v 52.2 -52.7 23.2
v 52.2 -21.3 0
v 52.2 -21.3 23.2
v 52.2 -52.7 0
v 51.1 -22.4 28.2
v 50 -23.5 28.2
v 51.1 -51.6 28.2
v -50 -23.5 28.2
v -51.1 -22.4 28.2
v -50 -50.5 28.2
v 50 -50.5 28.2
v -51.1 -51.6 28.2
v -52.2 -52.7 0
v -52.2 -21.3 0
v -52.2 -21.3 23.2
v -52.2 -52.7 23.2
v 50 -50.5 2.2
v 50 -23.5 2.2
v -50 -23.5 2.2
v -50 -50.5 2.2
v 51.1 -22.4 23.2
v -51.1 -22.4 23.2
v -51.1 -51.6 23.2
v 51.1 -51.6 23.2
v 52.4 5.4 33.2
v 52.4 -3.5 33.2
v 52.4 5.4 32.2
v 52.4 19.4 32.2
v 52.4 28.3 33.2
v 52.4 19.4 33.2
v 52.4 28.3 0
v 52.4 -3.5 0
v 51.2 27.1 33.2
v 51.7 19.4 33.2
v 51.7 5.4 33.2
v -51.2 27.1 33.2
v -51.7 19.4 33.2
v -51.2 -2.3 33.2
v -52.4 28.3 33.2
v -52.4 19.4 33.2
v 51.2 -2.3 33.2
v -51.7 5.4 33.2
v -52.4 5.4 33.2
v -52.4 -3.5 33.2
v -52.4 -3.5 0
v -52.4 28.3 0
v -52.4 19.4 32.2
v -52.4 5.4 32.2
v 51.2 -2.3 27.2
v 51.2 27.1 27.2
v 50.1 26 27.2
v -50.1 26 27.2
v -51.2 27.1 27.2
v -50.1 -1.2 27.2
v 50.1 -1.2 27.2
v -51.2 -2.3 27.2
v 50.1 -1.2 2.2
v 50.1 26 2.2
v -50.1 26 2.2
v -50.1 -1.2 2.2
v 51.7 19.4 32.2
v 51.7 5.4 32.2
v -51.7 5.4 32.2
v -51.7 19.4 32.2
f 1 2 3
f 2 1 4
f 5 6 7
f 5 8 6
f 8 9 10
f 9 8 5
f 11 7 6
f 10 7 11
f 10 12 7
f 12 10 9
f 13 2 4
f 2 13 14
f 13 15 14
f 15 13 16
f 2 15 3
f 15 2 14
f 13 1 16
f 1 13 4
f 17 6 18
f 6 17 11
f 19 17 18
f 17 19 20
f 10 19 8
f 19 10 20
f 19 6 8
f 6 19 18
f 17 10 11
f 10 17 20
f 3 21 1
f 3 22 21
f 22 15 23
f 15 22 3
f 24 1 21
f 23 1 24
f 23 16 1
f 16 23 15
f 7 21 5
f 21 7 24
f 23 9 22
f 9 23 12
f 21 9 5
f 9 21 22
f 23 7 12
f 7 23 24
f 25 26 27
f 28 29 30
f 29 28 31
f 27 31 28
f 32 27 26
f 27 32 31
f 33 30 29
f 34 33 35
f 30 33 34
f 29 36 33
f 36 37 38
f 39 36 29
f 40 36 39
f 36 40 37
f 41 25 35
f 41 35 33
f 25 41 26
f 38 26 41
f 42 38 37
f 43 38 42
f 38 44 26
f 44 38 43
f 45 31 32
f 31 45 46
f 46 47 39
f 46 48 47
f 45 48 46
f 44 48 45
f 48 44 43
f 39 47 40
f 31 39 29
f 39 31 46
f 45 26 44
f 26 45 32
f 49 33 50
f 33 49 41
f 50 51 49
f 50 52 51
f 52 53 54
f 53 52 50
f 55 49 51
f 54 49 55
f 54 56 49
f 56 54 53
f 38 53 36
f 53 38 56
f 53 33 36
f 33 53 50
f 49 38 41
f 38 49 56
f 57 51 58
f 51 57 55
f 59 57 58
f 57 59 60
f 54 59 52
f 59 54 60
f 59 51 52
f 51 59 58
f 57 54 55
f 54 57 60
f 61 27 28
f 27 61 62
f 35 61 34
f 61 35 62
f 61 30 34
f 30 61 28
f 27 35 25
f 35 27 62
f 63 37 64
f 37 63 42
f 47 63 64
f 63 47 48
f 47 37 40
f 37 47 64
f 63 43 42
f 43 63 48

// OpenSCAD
offset=10;

inner_dim_x=100;
inner_dim_y=27;
inner_dim_z=26;
wall_thickness=2.2;

shoulder_thickness=1;
shoulder_height=5;
cover_height_without_shoulder=25;
cover_height=shoulder_height+cover_height_without_shoulder;
spacing=0.2;
spacing_vertical=1;



Assembly();

module Assembly(){
    translate([0,-inner_dim_y-offset,0]) Box();
    translate([0,inner_dim_y+offset,0]) Box_Cover();
}
module Box(){
    translate([0,0,(inner_dim_z+wall_thickness)/2])
    difference(){
    difference(){
            cube ([inner_dim_x+(2*wall_thickness),inner_dim_y+(2*wall_thickness),inner_dim_z+wall_thickness], center= true);
            
        Inner_Cube();
        }
    Outer_Shoulder();
    }
}
    
module Inner_Cube(){
    translate ([0,0,wall_thickness/2]) cube ([inner_dim_x,inner_dim_y,inner_dim_z], center= true);
    }
    
module Outer_Shoulder(){
    translate ([0,0,(((inner_dim_z+wall_thickness)/2)-shoulder_height/2)])
    difference(){
        cube ([inner_dim_x+(2*wall_thickness),inner_dim_y+(2*wall_thickness),shoulder_height], center= true);
        cube ([inner_dim_x+wall_thickness,inner_dim_y+wall_thickness,shoulder_height], center= true);
        }
}
    
module Box_Cover(){
    translate([0,-((inner_dim_y+wall_thickness)/2)-10,(cover_height+wall_thickness+spacing_vertical)/2]){
        difference(){
            difference(){
                difference(){
                    cube ([inner_dim_x+(2*wall_thickness)+2*spacing,inner_dim_y+(2*wall_thickness)+2*spacing,cover_height+wall_thickness+spacing_vertical], center= true);
                    translate ([0,0,wall_thickness/2+(cover_height-shoulder_height)/2]) cube ([inner_dim_x+wall_thickness+spacing,inner_dim_y+wall_thickness+spacing,shoulder_height+spacing_vertical], center= true);
                    translate ([0,0,wall_thickness/2]) cube ([inner_dim_x+spacing,inner_dim_y+spacing,cover_height+spacing_vertical], center= true);
                }
                color("red") translate([(inner_dim_x)/2+wall_thickness,0,(cover_height+spacing_vertical)/2+1]) cube([1,14,1.8],center=true);
            }
            color("red") translate([-((inner_dim_x)/2+wall_thickness),0,(cover_height+spacing_vertical)/2+1]) cube([1,14,1.8],center=true);
        }
    }
}

